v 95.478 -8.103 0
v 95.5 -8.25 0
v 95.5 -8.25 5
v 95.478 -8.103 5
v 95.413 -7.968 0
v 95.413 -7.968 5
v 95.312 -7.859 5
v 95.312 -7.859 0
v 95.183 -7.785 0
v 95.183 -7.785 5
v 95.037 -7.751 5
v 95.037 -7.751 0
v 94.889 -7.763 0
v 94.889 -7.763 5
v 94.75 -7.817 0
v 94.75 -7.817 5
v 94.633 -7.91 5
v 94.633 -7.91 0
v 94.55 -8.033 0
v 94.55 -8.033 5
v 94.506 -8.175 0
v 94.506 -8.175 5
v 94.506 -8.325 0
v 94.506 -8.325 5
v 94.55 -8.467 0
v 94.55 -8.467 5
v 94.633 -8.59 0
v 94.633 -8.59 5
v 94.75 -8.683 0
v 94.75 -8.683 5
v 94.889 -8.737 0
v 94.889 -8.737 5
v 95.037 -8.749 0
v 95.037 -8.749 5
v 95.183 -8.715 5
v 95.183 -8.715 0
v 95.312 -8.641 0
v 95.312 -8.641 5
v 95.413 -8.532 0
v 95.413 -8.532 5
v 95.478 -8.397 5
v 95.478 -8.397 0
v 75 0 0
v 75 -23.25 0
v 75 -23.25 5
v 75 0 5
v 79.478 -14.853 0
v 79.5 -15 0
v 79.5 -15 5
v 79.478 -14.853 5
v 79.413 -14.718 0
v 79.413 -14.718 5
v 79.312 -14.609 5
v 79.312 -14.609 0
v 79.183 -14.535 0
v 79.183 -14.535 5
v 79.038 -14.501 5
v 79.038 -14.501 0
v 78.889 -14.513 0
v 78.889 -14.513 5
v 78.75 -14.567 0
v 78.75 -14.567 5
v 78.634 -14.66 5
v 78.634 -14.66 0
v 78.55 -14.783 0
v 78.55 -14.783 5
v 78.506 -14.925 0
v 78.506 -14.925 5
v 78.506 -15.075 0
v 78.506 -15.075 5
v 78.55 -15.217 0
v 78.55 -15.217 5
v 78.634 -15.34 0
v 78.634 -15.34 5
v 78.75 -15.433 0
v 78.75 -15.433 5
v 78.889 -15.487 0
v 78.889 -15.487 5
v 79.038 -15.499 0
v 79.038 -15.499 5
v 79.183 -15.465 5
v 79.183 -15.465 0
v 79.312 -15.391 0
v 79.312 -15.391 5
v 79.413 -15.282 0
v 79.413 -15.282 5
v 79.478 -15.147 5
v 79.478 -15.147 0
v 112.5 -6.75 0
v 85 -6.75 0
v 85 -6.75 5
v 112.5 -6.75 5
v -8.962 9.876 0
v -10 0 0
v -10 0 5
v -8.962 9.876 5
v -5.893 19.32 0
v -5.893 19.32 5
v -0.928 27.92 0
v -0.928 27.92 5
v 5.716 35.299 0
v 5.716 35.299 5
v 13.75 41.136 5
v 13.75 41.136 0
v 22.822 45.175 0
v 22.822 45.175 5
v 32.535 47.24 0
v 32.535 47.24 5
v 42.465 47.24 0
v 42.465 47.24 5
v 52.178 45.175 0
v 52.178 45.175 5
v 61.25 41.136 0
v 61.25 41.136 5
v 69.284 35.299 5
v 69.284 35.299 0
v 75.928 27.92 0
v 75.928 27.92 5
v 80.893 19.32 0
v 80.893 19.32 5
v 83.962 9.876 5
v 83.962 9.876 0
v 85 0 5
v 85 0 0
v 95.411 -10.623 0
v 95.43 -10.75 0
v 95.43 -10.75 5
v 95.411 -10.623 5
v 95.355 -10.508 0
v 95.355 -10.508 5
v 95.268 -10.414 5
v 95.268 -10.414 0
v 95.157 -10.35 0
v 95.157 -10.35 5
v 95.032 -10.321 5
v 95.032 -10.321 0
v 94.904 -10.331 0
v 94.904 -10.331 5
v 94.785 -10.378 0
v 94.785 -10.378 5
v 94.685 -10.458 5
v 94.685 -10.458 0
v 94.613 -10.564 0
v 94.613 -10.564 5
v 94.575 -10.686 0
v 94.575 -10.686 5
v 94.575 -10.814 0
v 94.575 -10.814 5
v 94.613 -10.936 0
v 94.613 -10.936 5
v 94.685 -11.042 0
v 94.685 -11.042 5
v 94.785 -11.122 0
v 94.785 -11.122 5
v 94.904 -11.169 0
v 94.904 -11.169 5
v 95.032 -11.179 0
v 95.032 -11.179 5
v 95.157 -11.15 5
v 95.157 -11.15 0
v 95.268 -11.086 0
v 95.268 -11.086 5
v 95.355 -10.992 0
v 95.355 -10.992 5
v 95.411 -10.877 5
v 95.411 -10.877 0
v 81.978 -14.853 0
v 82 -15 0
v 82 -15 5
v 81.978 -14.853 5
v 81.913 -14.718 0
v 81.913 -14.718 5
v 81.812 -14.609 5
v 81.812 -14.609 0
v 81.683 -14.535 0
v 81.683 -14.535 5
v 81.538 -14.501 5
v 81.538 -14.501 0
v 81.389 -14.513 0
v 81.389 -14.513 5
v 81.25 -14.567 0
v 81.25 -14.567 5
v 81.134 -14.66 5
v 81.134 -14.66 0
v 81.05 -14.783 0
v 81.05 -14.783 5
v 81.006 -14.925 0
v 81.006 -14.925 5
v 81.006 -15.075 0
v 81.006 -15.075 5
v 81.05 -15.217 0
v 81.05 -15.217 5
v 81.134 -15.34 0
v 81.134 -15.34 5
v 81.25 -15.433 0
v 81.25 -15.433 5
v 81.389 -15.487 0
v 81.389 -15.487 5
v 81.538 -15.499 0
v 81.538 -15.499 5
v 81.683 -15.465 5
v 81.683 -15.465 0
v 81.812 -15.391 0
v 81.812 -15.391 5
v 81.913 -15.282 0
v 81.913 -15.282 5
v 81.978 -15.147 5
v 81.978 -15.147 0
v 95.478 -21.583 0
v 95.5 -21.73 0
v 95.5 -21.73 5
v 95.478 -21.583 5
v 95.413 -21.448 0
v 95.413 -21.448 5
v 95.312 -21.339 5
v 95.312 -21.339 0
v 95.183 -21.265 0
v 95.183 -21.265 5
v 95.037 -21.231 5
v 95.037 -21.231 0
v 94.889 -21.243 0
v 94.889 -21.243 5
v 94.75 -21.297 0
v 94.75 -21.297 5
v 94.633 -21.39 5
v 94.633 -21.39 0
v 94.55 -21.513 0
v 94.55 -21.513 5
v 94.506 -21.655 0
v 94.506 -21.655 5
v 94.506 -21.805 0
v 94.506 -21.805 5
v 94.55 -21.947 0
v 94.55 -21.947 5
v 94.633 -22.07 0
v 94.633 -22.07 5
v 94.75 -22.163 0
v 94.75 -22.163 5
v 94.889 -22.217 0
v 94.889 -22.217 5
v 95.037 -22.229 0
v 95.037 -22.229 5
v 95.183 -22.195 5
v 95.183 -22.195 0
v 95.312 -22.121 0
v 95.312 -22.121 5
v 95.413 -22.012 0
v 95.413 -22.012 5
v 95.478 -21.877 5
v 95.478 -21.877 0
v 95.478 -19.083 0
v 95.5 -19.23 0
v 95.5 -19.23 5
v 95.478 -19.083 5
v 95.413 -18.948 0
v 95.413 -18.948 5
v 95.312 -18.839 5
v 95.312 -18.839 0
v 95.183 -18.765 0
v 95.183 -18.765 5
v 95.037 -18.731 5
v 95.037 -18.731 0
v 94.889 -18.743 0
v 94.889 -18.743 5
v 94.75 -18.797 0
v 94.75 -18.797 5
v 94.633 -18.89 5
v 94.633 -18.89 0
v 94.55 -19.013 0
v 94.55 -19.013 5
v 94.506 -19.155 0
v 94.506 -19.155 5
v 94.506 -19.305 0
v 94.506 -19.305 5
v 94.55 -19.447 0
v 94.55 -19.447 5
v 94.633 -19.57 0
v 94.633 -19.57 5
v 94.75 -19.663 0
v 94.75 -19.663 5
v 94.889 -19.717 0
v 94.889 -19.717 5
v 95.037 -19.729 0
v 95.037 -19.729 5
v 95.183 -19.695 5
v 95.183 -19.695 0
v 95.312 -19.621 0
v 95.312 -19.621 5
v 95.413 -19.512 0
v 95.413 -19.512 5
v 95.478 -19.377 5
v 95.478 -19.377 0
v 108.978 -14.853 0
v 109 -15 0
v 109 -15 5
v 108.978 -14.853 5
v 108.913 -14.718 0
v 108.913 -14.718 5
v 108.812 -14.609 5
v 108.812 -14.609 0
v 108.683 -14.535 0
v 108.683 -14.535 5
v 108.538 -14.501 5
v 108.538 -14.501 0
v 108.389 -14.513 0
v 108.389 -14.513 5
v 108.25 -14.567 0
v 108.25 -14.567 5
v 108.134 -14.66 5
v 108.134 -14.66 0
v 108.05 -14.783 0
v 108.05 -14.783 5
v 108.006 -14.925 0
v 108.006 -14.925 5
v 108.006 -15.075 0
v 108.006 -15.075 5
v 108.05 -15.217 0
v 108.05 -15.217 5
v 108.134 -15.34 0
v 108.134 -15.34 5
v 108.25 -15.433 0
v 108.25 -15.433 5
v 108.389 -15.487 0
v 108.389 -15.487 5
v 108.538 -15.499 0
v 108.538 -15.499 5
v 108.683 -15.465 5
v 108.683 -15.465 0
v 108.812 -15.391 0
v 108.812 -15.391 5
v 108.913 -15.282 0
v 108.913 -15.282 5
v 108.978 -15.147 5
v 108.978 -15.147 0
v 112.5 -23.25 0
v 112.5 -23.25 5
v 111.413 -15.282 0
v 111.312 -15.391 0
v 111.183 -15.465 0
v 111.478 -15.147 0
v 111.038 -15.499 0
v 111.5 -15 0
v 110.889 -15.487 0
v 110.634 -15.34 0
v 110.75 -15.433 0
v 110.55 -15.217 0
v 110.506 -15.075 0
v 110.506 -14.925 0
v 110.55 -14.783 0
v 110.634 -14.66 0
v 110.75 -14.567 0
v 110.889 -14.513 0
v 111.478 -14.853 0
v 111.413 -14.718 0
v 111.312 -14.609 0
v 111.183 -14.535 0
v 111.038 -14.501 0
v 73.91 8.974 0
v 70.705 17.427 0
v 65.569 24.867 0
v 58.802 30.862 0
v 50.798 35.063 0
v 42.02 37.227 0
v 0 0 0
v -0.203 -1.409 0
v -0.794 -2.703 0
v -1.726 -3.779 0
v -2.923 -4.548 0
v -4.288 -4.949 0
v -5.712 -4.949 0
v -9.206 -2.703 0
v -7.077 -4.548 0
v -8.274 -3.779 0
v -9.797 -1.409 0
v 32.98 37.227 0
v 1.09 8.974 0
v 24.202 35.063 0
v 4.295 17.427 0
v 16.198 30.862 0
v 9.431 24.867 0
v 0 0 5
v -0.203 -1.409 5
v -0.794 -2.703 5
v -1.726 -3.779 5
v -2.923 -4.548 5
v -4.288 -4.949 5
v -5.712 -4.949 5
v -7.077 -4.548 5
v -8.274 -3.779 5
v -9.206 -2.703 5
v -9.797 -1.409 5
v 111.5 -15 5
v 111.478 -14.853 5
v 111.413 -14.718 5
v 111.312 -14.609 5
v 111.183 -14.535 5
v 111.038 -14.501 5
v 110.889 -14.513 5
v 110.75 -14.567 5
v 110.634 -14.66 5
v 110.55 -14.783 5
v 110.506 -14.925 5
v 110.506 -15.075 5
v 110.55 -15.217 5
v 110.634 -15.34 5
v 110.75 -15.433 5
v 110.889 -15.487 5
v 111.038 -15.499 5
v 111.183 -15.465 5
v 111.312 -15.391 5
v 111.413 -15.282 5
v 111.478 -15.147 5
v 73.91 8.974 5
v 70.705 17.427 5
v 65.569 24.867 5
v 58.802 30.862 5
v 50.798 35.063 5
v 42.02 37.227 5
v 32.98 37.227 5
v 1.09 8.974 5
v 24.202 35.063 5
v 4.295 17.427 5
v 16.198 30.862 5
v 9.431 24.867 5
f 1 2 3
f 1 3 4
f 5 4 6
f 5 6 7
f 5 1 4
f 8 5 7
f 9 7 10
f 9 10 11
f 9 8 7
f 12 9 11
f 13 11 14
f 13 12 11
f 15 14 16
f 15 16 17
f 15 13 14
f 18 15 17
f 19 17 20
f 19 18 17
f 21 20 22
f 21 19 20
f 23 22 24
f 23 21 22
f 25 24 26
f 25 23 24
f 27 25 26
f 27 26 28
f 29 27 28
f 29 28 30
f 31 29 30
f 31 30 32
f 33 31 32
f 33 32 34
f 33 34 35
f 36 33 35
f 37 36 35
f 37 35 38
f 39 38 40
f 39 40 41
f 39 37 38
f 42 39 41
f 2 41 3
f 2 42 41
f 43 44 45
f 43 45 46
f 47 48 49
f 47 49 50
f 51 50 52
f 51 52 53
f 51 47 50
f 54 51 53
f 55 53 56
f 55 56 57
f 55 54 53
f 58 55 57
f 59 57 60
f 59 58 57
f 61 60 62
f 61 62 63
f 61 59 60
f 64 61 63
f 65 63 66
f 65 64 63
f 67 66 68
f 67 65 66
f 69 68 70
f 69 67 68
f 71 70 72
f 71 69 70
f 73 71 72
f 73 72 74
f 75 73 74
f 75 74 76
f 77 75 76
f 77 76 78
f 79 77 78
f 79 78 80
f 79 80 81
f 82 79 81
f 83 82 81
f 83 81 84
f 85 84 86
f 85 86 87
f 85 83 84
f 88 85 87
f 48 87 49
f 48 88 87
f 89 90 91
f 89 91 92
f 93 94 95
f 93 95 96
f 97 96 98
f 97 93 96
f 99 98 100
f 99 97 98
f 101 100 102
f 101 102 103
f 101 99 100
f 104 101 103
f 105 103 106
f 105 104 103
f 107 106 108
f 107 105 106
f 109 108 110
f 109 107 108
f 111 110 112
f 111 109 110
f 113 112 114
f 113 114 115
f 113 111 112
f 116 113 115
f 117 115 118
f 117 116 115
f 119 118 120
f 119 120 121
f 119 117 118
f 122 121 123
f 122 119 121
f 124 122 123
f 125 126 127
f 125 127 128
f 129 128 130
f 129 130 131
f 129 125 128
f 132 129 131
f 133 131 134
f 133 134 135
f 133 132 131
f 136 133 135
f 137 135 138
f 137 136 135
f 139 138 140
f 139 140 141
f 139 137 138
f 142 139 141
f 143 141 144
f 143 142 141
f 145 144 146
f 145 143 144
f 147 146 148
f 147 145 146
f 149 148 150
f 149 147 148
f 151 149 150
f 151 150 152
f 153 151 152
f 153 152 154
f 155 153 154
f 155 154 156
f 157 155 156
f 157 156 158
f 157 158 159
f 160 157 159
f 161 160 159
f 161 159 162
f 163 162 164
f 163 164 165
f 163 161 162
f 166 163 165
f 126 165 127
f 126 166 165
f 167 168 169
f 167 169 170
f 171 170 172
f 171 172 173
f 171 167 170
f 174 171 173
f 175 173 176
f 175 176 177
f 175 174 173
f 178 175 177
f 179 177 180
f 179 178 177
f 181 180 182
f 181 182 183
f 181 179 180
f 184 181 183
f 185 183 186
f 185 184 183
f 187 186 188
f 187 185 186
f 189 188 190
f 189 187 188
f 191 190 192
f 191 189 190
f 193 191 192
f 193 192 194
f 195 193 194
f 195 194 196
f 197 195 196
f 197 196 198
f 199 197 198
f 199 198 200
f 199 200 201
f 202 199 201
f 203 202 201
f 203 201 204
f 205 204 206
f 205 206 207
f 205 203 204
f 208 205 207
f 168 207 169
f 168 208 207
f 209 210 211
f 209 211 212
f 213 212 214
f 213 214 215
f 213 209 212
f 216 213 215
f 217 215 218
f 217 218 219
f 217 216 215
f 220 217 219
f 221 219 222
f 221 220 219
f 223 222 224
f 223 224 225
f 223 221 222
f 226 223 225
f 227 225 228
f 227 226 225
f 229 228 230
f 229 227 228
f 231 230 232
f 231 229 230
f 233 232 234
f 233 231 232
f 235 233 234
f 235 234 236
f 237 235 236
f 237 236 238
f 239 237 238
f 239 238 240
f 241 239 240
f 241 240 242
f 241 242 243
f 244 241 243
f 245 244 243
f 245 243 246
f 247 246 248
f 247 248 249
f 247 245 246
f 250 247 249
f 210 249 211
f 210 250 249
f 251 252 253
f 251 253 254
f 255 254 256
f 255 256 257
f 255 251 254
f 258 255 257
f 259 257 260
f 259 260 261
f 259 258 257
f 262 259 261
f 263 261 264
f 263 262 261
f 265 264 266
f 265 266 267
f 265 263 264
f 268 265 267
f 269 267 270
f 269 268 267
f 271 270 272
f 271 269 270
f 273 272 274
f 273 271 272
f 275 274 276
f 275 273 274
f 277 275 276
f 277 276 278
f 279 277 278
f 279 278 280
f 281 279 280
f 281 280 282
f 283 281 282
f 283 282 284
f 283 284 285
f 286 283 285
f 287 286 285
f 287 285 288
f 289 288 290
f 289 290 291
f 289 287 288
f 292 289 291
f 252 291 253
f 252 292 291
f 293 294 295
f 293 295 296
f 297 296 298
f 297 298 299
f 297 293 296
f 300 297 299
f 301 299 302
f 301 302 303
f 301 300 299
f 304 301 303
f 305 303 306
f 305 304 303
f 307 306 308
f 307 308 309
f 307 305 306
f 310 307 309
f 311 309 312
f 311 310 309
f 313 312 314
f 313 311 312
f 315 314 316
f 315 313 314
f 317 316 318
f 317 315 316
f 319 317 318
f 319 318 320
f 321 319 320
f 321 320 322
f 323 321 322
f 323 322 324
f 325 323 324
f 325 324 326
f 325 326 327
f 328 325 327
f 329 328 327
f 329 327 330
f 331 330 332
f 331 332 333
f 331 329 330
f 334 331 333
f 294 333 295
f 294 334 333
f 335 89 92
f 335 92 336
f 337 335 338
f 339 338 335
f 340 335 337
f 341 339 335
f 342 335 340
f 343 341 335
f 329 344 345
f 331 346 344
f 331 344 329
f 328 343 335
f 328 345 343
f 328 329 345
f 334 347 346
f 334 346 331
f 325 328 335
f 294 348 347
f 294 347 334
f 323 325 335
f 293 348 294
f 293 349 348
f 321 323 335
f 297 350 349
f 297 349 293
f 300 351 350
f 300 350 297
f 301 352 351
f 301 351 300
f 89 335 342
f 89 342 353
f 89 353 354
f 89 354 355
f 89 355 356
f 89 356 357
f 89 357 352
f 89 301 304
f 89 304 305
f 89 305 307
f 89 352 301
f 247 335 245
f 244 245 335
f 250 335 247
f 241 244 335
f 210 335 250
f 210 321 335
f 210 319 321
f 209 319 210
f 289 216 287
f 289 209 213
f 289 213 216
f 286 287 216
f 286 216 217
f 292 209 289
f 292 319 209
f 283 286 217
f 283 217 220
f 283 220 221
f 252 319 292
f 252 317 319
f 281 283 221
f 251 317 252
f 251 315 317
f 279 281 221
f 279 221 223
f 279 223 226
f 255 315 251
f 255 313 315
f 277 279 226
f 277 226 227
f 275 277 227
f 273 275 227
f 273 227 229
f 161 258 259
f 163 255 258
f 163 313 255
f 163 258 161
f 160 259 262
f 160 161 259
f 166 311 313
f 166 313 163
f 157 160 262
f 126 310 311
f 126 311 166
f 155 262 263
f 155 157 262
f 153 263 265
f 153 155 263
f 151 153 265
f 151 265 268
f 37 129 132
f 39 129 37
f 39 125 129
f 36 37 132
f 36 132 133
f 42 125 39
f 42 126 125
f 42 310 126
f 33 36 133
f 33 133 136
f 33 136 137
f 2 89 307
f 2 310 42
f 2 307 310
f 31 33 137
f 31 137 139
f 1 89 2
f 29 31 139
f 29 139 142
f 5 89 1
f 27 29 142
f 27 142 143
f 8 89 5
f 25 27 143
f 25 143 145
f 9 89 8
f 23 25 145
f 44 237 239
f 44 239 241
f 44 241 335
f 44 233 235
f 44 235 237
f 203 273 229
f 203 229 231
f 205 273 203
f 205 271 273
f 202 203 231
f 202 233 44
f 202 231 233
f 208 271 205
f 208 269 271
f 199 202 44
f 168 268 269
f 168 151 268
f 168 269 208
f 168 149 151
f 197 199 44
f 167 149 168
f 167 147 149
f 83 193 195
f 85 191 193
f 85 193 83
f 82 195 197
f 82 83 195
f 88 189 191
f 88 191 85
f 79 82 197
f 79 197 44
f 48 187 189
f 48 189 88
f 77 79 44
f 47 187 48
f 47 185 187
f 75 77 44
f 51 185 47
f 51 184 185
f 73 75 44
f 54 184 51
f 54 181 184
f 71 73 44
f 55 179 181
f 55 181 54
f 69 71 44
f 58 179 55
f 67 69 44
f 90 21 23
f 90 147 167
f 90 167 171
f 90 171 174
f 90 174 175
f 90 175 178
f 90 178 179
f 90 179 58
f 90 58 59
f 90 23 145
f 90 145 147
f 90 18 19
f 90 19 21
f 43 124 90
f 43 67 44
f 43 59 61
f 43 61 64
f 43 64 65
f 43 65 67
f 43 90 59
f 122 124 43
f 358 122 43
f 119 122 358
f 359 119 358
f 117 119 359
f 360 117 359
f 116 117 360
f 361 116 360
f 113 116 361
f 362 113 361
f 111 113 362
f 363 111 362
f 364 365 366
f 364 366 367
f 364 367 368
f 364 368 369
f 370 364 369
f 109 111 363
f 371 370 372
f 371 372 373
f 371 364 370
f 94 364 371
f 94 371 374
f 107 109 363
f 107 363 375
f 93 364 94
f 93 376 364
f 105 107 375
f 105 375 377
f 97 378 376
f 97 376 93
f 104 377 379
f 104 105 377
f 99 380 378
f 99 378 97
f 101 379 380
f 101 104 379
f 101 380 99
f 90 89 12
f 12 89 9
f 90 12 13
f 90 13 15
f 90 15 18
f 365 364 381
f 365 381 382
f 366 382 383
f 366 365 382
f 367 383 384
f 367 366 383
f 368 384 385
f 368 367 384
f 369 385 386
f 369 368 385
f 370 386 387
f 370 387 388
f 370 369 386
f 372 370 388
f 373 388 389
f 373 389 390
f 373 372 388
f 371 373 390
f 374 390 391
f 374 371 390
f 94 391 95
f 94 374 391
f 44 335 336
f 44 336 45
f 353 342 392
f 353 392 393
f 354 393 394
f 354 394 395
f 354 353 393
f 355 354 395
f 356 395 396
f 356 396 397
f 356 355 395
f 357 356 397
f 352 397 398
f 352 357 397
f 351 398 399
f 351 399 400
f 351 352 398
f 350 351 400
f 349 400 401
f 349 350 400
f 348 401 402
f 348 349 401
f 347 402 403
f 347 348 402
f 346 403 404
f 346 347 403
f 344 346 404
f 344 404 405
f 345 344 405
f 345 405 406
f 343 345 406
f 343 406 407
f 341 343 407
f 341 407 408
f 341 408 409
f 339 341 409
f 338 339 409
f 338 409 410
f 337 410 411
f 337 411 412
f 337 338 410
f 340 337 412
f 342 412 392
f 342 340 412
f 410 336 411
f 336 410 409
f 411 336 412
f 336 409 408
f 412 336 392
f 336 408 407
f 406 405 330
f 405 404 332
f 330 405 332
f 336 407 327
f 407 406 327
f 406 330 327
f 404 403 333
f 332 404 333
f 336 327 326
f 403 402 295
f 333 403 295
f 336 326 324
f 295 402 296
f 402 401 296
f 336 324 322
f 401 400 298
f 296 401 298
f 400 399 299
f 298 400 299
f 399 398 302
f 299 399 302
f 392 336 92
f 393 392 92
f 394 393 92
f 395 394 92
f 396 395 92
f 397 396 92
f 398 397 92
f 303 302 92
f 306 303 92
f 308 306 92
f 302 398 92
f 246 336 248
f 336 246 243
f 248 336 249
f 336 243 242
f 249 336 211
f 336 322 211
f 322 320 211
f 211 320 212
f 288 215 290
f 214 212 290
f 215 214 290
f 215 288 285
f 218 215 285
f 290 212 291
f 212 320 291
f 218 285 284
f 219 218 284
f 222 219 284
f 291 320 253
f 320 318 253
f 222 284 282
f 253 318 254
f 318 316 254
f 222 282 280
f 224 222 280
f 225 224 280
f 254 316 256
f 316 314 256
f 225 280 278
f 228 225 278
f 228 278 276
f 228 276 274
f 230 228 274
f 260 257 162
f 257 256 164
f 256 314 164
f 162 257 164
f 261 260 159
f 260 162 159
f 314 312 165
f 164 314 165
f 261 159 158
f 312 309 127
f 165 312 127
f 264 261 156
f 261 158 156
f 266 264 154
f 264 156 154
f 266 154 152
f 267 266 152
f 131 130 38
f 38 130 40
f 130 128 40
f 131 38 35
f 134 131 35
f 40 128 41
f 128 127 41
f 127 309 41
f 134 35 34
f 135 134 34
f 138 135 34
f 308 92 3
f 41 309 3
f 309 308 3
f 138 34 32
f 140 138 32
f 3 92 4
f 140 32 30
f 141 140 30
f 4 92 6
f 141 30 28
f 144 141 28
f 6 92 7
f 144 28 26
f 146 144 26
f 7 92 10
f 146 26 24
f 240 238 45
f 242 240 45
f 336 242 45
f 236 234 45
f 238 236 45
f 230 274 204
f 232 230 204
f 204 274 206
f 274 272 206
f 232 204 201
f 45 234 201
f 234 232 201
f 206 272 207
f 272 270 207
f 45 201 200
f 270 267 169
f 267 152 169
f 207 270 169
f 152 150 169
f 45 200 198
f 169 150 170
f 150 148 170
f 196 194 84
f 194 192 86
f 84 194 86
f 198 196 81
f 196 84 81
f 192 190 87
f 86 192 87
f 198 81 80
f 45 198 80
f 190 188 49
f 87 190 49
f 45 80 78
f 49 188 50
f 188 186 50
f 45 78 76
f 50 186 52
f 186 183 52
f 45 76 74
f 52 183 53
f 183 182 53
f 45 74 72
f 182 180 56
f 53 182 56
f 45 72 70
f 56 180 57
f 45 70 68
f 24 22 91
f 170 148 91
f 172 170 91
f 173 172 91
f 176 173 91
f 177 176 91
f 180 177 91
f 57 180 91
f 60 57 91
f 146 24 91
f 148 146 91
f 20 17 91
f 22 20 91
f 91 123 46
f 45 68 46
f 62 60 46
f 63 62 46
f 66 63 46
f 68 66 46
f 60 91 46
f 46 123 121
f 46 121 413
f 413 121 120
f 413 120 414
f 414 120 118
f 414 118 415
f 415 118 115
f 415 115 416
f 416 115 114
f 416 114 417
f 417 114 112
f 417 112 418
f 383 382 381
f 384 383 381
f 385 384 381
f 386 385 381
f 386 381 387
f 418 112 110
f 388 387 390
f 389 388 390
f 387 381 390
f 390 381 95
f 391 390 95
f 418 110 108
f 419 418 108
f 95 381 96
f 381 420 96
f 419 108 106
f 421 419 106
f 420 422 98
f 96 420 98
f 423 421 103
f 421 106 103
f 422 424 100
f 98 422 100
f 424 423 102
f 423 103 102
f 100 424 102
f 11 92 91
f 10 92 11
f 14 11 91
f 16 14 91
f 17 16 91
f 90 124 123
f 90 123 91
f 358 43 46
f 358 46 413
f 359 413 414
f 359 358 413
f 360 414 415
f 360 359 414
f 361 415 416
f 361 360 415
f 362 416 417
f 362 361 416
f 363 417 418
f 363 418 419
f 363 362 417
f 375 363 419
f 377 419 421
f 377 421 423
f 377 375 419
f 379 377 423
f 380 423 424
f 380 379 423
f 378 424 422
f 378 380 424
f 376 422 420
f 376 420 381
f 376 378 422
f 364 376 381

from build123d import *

# Parameters (mm, degrees)
SKETCH1_R           = 0.5
SKETCH1_R_2         = 0.429709329
BOSS_EXTRUDE1_DEPTH = 5


with BuildPart() as part:
    # Sketch1 → Boss-Extrude1 (new body)
    with BuildSketch(Plane.XY):
        with BuildLine():
            Line((85, 0), (85, -6.75))
            Line((85, -6.75), (112.500186095, -6.75))
            Line((112.500186095, -6.75), (112.500186095, -23.25))
            Line((112.500186095, -23.25), (77.499813905, -23.25))
            Line((77.499813905, -23.25), (75, -23.25))
            Line((75, -23.25), (75, 0))
            ThreePointArc((75, 0), (37.5, 37.5), (0, 0))
            ThreePointArc((0, 0), (-5, -5), (-10, 0))
            ThreePointArc((-10, 0), (37.5, 47.5), (85, 0))
        make_face()
        with Locations((95, -8.25)):
            Circle(SKETCH1_R, mode=Mode.SUBTRACT)
        with Locations((95, -10.75)):
            Circle(SKETCH1_R_2, mode=Mode.SUBTRACT)
        with Locations((95, -21.73)):
            Circle(SKETCH1_R, mode=Mode.SUBTRACT)
        with Locations((95, -19.23)):
            Circle(SKETCH1_R, mode=Mode.SUBTRACT)
        with Locations((111.000186095, -15)):
            Circle(SKETCH1_R, mode=Mode.SUBTRACT)
        with Locations((108.500186095, -15)):
            Circle(SKETCH1_R, mode=Mode.SUBTRACT)
        with Locations((81.500186095, -15)):
            Circle(SKETCH1_R, mode=Mode.SUBTRACT)
        with Locations((79.000186095, -15)):
            Circle(SKETCH1_R, mode=Mode.SUBTRACT)
    extrude(amount=BOSS_EXTRUDE1_DEPTH)


solid = part.part
